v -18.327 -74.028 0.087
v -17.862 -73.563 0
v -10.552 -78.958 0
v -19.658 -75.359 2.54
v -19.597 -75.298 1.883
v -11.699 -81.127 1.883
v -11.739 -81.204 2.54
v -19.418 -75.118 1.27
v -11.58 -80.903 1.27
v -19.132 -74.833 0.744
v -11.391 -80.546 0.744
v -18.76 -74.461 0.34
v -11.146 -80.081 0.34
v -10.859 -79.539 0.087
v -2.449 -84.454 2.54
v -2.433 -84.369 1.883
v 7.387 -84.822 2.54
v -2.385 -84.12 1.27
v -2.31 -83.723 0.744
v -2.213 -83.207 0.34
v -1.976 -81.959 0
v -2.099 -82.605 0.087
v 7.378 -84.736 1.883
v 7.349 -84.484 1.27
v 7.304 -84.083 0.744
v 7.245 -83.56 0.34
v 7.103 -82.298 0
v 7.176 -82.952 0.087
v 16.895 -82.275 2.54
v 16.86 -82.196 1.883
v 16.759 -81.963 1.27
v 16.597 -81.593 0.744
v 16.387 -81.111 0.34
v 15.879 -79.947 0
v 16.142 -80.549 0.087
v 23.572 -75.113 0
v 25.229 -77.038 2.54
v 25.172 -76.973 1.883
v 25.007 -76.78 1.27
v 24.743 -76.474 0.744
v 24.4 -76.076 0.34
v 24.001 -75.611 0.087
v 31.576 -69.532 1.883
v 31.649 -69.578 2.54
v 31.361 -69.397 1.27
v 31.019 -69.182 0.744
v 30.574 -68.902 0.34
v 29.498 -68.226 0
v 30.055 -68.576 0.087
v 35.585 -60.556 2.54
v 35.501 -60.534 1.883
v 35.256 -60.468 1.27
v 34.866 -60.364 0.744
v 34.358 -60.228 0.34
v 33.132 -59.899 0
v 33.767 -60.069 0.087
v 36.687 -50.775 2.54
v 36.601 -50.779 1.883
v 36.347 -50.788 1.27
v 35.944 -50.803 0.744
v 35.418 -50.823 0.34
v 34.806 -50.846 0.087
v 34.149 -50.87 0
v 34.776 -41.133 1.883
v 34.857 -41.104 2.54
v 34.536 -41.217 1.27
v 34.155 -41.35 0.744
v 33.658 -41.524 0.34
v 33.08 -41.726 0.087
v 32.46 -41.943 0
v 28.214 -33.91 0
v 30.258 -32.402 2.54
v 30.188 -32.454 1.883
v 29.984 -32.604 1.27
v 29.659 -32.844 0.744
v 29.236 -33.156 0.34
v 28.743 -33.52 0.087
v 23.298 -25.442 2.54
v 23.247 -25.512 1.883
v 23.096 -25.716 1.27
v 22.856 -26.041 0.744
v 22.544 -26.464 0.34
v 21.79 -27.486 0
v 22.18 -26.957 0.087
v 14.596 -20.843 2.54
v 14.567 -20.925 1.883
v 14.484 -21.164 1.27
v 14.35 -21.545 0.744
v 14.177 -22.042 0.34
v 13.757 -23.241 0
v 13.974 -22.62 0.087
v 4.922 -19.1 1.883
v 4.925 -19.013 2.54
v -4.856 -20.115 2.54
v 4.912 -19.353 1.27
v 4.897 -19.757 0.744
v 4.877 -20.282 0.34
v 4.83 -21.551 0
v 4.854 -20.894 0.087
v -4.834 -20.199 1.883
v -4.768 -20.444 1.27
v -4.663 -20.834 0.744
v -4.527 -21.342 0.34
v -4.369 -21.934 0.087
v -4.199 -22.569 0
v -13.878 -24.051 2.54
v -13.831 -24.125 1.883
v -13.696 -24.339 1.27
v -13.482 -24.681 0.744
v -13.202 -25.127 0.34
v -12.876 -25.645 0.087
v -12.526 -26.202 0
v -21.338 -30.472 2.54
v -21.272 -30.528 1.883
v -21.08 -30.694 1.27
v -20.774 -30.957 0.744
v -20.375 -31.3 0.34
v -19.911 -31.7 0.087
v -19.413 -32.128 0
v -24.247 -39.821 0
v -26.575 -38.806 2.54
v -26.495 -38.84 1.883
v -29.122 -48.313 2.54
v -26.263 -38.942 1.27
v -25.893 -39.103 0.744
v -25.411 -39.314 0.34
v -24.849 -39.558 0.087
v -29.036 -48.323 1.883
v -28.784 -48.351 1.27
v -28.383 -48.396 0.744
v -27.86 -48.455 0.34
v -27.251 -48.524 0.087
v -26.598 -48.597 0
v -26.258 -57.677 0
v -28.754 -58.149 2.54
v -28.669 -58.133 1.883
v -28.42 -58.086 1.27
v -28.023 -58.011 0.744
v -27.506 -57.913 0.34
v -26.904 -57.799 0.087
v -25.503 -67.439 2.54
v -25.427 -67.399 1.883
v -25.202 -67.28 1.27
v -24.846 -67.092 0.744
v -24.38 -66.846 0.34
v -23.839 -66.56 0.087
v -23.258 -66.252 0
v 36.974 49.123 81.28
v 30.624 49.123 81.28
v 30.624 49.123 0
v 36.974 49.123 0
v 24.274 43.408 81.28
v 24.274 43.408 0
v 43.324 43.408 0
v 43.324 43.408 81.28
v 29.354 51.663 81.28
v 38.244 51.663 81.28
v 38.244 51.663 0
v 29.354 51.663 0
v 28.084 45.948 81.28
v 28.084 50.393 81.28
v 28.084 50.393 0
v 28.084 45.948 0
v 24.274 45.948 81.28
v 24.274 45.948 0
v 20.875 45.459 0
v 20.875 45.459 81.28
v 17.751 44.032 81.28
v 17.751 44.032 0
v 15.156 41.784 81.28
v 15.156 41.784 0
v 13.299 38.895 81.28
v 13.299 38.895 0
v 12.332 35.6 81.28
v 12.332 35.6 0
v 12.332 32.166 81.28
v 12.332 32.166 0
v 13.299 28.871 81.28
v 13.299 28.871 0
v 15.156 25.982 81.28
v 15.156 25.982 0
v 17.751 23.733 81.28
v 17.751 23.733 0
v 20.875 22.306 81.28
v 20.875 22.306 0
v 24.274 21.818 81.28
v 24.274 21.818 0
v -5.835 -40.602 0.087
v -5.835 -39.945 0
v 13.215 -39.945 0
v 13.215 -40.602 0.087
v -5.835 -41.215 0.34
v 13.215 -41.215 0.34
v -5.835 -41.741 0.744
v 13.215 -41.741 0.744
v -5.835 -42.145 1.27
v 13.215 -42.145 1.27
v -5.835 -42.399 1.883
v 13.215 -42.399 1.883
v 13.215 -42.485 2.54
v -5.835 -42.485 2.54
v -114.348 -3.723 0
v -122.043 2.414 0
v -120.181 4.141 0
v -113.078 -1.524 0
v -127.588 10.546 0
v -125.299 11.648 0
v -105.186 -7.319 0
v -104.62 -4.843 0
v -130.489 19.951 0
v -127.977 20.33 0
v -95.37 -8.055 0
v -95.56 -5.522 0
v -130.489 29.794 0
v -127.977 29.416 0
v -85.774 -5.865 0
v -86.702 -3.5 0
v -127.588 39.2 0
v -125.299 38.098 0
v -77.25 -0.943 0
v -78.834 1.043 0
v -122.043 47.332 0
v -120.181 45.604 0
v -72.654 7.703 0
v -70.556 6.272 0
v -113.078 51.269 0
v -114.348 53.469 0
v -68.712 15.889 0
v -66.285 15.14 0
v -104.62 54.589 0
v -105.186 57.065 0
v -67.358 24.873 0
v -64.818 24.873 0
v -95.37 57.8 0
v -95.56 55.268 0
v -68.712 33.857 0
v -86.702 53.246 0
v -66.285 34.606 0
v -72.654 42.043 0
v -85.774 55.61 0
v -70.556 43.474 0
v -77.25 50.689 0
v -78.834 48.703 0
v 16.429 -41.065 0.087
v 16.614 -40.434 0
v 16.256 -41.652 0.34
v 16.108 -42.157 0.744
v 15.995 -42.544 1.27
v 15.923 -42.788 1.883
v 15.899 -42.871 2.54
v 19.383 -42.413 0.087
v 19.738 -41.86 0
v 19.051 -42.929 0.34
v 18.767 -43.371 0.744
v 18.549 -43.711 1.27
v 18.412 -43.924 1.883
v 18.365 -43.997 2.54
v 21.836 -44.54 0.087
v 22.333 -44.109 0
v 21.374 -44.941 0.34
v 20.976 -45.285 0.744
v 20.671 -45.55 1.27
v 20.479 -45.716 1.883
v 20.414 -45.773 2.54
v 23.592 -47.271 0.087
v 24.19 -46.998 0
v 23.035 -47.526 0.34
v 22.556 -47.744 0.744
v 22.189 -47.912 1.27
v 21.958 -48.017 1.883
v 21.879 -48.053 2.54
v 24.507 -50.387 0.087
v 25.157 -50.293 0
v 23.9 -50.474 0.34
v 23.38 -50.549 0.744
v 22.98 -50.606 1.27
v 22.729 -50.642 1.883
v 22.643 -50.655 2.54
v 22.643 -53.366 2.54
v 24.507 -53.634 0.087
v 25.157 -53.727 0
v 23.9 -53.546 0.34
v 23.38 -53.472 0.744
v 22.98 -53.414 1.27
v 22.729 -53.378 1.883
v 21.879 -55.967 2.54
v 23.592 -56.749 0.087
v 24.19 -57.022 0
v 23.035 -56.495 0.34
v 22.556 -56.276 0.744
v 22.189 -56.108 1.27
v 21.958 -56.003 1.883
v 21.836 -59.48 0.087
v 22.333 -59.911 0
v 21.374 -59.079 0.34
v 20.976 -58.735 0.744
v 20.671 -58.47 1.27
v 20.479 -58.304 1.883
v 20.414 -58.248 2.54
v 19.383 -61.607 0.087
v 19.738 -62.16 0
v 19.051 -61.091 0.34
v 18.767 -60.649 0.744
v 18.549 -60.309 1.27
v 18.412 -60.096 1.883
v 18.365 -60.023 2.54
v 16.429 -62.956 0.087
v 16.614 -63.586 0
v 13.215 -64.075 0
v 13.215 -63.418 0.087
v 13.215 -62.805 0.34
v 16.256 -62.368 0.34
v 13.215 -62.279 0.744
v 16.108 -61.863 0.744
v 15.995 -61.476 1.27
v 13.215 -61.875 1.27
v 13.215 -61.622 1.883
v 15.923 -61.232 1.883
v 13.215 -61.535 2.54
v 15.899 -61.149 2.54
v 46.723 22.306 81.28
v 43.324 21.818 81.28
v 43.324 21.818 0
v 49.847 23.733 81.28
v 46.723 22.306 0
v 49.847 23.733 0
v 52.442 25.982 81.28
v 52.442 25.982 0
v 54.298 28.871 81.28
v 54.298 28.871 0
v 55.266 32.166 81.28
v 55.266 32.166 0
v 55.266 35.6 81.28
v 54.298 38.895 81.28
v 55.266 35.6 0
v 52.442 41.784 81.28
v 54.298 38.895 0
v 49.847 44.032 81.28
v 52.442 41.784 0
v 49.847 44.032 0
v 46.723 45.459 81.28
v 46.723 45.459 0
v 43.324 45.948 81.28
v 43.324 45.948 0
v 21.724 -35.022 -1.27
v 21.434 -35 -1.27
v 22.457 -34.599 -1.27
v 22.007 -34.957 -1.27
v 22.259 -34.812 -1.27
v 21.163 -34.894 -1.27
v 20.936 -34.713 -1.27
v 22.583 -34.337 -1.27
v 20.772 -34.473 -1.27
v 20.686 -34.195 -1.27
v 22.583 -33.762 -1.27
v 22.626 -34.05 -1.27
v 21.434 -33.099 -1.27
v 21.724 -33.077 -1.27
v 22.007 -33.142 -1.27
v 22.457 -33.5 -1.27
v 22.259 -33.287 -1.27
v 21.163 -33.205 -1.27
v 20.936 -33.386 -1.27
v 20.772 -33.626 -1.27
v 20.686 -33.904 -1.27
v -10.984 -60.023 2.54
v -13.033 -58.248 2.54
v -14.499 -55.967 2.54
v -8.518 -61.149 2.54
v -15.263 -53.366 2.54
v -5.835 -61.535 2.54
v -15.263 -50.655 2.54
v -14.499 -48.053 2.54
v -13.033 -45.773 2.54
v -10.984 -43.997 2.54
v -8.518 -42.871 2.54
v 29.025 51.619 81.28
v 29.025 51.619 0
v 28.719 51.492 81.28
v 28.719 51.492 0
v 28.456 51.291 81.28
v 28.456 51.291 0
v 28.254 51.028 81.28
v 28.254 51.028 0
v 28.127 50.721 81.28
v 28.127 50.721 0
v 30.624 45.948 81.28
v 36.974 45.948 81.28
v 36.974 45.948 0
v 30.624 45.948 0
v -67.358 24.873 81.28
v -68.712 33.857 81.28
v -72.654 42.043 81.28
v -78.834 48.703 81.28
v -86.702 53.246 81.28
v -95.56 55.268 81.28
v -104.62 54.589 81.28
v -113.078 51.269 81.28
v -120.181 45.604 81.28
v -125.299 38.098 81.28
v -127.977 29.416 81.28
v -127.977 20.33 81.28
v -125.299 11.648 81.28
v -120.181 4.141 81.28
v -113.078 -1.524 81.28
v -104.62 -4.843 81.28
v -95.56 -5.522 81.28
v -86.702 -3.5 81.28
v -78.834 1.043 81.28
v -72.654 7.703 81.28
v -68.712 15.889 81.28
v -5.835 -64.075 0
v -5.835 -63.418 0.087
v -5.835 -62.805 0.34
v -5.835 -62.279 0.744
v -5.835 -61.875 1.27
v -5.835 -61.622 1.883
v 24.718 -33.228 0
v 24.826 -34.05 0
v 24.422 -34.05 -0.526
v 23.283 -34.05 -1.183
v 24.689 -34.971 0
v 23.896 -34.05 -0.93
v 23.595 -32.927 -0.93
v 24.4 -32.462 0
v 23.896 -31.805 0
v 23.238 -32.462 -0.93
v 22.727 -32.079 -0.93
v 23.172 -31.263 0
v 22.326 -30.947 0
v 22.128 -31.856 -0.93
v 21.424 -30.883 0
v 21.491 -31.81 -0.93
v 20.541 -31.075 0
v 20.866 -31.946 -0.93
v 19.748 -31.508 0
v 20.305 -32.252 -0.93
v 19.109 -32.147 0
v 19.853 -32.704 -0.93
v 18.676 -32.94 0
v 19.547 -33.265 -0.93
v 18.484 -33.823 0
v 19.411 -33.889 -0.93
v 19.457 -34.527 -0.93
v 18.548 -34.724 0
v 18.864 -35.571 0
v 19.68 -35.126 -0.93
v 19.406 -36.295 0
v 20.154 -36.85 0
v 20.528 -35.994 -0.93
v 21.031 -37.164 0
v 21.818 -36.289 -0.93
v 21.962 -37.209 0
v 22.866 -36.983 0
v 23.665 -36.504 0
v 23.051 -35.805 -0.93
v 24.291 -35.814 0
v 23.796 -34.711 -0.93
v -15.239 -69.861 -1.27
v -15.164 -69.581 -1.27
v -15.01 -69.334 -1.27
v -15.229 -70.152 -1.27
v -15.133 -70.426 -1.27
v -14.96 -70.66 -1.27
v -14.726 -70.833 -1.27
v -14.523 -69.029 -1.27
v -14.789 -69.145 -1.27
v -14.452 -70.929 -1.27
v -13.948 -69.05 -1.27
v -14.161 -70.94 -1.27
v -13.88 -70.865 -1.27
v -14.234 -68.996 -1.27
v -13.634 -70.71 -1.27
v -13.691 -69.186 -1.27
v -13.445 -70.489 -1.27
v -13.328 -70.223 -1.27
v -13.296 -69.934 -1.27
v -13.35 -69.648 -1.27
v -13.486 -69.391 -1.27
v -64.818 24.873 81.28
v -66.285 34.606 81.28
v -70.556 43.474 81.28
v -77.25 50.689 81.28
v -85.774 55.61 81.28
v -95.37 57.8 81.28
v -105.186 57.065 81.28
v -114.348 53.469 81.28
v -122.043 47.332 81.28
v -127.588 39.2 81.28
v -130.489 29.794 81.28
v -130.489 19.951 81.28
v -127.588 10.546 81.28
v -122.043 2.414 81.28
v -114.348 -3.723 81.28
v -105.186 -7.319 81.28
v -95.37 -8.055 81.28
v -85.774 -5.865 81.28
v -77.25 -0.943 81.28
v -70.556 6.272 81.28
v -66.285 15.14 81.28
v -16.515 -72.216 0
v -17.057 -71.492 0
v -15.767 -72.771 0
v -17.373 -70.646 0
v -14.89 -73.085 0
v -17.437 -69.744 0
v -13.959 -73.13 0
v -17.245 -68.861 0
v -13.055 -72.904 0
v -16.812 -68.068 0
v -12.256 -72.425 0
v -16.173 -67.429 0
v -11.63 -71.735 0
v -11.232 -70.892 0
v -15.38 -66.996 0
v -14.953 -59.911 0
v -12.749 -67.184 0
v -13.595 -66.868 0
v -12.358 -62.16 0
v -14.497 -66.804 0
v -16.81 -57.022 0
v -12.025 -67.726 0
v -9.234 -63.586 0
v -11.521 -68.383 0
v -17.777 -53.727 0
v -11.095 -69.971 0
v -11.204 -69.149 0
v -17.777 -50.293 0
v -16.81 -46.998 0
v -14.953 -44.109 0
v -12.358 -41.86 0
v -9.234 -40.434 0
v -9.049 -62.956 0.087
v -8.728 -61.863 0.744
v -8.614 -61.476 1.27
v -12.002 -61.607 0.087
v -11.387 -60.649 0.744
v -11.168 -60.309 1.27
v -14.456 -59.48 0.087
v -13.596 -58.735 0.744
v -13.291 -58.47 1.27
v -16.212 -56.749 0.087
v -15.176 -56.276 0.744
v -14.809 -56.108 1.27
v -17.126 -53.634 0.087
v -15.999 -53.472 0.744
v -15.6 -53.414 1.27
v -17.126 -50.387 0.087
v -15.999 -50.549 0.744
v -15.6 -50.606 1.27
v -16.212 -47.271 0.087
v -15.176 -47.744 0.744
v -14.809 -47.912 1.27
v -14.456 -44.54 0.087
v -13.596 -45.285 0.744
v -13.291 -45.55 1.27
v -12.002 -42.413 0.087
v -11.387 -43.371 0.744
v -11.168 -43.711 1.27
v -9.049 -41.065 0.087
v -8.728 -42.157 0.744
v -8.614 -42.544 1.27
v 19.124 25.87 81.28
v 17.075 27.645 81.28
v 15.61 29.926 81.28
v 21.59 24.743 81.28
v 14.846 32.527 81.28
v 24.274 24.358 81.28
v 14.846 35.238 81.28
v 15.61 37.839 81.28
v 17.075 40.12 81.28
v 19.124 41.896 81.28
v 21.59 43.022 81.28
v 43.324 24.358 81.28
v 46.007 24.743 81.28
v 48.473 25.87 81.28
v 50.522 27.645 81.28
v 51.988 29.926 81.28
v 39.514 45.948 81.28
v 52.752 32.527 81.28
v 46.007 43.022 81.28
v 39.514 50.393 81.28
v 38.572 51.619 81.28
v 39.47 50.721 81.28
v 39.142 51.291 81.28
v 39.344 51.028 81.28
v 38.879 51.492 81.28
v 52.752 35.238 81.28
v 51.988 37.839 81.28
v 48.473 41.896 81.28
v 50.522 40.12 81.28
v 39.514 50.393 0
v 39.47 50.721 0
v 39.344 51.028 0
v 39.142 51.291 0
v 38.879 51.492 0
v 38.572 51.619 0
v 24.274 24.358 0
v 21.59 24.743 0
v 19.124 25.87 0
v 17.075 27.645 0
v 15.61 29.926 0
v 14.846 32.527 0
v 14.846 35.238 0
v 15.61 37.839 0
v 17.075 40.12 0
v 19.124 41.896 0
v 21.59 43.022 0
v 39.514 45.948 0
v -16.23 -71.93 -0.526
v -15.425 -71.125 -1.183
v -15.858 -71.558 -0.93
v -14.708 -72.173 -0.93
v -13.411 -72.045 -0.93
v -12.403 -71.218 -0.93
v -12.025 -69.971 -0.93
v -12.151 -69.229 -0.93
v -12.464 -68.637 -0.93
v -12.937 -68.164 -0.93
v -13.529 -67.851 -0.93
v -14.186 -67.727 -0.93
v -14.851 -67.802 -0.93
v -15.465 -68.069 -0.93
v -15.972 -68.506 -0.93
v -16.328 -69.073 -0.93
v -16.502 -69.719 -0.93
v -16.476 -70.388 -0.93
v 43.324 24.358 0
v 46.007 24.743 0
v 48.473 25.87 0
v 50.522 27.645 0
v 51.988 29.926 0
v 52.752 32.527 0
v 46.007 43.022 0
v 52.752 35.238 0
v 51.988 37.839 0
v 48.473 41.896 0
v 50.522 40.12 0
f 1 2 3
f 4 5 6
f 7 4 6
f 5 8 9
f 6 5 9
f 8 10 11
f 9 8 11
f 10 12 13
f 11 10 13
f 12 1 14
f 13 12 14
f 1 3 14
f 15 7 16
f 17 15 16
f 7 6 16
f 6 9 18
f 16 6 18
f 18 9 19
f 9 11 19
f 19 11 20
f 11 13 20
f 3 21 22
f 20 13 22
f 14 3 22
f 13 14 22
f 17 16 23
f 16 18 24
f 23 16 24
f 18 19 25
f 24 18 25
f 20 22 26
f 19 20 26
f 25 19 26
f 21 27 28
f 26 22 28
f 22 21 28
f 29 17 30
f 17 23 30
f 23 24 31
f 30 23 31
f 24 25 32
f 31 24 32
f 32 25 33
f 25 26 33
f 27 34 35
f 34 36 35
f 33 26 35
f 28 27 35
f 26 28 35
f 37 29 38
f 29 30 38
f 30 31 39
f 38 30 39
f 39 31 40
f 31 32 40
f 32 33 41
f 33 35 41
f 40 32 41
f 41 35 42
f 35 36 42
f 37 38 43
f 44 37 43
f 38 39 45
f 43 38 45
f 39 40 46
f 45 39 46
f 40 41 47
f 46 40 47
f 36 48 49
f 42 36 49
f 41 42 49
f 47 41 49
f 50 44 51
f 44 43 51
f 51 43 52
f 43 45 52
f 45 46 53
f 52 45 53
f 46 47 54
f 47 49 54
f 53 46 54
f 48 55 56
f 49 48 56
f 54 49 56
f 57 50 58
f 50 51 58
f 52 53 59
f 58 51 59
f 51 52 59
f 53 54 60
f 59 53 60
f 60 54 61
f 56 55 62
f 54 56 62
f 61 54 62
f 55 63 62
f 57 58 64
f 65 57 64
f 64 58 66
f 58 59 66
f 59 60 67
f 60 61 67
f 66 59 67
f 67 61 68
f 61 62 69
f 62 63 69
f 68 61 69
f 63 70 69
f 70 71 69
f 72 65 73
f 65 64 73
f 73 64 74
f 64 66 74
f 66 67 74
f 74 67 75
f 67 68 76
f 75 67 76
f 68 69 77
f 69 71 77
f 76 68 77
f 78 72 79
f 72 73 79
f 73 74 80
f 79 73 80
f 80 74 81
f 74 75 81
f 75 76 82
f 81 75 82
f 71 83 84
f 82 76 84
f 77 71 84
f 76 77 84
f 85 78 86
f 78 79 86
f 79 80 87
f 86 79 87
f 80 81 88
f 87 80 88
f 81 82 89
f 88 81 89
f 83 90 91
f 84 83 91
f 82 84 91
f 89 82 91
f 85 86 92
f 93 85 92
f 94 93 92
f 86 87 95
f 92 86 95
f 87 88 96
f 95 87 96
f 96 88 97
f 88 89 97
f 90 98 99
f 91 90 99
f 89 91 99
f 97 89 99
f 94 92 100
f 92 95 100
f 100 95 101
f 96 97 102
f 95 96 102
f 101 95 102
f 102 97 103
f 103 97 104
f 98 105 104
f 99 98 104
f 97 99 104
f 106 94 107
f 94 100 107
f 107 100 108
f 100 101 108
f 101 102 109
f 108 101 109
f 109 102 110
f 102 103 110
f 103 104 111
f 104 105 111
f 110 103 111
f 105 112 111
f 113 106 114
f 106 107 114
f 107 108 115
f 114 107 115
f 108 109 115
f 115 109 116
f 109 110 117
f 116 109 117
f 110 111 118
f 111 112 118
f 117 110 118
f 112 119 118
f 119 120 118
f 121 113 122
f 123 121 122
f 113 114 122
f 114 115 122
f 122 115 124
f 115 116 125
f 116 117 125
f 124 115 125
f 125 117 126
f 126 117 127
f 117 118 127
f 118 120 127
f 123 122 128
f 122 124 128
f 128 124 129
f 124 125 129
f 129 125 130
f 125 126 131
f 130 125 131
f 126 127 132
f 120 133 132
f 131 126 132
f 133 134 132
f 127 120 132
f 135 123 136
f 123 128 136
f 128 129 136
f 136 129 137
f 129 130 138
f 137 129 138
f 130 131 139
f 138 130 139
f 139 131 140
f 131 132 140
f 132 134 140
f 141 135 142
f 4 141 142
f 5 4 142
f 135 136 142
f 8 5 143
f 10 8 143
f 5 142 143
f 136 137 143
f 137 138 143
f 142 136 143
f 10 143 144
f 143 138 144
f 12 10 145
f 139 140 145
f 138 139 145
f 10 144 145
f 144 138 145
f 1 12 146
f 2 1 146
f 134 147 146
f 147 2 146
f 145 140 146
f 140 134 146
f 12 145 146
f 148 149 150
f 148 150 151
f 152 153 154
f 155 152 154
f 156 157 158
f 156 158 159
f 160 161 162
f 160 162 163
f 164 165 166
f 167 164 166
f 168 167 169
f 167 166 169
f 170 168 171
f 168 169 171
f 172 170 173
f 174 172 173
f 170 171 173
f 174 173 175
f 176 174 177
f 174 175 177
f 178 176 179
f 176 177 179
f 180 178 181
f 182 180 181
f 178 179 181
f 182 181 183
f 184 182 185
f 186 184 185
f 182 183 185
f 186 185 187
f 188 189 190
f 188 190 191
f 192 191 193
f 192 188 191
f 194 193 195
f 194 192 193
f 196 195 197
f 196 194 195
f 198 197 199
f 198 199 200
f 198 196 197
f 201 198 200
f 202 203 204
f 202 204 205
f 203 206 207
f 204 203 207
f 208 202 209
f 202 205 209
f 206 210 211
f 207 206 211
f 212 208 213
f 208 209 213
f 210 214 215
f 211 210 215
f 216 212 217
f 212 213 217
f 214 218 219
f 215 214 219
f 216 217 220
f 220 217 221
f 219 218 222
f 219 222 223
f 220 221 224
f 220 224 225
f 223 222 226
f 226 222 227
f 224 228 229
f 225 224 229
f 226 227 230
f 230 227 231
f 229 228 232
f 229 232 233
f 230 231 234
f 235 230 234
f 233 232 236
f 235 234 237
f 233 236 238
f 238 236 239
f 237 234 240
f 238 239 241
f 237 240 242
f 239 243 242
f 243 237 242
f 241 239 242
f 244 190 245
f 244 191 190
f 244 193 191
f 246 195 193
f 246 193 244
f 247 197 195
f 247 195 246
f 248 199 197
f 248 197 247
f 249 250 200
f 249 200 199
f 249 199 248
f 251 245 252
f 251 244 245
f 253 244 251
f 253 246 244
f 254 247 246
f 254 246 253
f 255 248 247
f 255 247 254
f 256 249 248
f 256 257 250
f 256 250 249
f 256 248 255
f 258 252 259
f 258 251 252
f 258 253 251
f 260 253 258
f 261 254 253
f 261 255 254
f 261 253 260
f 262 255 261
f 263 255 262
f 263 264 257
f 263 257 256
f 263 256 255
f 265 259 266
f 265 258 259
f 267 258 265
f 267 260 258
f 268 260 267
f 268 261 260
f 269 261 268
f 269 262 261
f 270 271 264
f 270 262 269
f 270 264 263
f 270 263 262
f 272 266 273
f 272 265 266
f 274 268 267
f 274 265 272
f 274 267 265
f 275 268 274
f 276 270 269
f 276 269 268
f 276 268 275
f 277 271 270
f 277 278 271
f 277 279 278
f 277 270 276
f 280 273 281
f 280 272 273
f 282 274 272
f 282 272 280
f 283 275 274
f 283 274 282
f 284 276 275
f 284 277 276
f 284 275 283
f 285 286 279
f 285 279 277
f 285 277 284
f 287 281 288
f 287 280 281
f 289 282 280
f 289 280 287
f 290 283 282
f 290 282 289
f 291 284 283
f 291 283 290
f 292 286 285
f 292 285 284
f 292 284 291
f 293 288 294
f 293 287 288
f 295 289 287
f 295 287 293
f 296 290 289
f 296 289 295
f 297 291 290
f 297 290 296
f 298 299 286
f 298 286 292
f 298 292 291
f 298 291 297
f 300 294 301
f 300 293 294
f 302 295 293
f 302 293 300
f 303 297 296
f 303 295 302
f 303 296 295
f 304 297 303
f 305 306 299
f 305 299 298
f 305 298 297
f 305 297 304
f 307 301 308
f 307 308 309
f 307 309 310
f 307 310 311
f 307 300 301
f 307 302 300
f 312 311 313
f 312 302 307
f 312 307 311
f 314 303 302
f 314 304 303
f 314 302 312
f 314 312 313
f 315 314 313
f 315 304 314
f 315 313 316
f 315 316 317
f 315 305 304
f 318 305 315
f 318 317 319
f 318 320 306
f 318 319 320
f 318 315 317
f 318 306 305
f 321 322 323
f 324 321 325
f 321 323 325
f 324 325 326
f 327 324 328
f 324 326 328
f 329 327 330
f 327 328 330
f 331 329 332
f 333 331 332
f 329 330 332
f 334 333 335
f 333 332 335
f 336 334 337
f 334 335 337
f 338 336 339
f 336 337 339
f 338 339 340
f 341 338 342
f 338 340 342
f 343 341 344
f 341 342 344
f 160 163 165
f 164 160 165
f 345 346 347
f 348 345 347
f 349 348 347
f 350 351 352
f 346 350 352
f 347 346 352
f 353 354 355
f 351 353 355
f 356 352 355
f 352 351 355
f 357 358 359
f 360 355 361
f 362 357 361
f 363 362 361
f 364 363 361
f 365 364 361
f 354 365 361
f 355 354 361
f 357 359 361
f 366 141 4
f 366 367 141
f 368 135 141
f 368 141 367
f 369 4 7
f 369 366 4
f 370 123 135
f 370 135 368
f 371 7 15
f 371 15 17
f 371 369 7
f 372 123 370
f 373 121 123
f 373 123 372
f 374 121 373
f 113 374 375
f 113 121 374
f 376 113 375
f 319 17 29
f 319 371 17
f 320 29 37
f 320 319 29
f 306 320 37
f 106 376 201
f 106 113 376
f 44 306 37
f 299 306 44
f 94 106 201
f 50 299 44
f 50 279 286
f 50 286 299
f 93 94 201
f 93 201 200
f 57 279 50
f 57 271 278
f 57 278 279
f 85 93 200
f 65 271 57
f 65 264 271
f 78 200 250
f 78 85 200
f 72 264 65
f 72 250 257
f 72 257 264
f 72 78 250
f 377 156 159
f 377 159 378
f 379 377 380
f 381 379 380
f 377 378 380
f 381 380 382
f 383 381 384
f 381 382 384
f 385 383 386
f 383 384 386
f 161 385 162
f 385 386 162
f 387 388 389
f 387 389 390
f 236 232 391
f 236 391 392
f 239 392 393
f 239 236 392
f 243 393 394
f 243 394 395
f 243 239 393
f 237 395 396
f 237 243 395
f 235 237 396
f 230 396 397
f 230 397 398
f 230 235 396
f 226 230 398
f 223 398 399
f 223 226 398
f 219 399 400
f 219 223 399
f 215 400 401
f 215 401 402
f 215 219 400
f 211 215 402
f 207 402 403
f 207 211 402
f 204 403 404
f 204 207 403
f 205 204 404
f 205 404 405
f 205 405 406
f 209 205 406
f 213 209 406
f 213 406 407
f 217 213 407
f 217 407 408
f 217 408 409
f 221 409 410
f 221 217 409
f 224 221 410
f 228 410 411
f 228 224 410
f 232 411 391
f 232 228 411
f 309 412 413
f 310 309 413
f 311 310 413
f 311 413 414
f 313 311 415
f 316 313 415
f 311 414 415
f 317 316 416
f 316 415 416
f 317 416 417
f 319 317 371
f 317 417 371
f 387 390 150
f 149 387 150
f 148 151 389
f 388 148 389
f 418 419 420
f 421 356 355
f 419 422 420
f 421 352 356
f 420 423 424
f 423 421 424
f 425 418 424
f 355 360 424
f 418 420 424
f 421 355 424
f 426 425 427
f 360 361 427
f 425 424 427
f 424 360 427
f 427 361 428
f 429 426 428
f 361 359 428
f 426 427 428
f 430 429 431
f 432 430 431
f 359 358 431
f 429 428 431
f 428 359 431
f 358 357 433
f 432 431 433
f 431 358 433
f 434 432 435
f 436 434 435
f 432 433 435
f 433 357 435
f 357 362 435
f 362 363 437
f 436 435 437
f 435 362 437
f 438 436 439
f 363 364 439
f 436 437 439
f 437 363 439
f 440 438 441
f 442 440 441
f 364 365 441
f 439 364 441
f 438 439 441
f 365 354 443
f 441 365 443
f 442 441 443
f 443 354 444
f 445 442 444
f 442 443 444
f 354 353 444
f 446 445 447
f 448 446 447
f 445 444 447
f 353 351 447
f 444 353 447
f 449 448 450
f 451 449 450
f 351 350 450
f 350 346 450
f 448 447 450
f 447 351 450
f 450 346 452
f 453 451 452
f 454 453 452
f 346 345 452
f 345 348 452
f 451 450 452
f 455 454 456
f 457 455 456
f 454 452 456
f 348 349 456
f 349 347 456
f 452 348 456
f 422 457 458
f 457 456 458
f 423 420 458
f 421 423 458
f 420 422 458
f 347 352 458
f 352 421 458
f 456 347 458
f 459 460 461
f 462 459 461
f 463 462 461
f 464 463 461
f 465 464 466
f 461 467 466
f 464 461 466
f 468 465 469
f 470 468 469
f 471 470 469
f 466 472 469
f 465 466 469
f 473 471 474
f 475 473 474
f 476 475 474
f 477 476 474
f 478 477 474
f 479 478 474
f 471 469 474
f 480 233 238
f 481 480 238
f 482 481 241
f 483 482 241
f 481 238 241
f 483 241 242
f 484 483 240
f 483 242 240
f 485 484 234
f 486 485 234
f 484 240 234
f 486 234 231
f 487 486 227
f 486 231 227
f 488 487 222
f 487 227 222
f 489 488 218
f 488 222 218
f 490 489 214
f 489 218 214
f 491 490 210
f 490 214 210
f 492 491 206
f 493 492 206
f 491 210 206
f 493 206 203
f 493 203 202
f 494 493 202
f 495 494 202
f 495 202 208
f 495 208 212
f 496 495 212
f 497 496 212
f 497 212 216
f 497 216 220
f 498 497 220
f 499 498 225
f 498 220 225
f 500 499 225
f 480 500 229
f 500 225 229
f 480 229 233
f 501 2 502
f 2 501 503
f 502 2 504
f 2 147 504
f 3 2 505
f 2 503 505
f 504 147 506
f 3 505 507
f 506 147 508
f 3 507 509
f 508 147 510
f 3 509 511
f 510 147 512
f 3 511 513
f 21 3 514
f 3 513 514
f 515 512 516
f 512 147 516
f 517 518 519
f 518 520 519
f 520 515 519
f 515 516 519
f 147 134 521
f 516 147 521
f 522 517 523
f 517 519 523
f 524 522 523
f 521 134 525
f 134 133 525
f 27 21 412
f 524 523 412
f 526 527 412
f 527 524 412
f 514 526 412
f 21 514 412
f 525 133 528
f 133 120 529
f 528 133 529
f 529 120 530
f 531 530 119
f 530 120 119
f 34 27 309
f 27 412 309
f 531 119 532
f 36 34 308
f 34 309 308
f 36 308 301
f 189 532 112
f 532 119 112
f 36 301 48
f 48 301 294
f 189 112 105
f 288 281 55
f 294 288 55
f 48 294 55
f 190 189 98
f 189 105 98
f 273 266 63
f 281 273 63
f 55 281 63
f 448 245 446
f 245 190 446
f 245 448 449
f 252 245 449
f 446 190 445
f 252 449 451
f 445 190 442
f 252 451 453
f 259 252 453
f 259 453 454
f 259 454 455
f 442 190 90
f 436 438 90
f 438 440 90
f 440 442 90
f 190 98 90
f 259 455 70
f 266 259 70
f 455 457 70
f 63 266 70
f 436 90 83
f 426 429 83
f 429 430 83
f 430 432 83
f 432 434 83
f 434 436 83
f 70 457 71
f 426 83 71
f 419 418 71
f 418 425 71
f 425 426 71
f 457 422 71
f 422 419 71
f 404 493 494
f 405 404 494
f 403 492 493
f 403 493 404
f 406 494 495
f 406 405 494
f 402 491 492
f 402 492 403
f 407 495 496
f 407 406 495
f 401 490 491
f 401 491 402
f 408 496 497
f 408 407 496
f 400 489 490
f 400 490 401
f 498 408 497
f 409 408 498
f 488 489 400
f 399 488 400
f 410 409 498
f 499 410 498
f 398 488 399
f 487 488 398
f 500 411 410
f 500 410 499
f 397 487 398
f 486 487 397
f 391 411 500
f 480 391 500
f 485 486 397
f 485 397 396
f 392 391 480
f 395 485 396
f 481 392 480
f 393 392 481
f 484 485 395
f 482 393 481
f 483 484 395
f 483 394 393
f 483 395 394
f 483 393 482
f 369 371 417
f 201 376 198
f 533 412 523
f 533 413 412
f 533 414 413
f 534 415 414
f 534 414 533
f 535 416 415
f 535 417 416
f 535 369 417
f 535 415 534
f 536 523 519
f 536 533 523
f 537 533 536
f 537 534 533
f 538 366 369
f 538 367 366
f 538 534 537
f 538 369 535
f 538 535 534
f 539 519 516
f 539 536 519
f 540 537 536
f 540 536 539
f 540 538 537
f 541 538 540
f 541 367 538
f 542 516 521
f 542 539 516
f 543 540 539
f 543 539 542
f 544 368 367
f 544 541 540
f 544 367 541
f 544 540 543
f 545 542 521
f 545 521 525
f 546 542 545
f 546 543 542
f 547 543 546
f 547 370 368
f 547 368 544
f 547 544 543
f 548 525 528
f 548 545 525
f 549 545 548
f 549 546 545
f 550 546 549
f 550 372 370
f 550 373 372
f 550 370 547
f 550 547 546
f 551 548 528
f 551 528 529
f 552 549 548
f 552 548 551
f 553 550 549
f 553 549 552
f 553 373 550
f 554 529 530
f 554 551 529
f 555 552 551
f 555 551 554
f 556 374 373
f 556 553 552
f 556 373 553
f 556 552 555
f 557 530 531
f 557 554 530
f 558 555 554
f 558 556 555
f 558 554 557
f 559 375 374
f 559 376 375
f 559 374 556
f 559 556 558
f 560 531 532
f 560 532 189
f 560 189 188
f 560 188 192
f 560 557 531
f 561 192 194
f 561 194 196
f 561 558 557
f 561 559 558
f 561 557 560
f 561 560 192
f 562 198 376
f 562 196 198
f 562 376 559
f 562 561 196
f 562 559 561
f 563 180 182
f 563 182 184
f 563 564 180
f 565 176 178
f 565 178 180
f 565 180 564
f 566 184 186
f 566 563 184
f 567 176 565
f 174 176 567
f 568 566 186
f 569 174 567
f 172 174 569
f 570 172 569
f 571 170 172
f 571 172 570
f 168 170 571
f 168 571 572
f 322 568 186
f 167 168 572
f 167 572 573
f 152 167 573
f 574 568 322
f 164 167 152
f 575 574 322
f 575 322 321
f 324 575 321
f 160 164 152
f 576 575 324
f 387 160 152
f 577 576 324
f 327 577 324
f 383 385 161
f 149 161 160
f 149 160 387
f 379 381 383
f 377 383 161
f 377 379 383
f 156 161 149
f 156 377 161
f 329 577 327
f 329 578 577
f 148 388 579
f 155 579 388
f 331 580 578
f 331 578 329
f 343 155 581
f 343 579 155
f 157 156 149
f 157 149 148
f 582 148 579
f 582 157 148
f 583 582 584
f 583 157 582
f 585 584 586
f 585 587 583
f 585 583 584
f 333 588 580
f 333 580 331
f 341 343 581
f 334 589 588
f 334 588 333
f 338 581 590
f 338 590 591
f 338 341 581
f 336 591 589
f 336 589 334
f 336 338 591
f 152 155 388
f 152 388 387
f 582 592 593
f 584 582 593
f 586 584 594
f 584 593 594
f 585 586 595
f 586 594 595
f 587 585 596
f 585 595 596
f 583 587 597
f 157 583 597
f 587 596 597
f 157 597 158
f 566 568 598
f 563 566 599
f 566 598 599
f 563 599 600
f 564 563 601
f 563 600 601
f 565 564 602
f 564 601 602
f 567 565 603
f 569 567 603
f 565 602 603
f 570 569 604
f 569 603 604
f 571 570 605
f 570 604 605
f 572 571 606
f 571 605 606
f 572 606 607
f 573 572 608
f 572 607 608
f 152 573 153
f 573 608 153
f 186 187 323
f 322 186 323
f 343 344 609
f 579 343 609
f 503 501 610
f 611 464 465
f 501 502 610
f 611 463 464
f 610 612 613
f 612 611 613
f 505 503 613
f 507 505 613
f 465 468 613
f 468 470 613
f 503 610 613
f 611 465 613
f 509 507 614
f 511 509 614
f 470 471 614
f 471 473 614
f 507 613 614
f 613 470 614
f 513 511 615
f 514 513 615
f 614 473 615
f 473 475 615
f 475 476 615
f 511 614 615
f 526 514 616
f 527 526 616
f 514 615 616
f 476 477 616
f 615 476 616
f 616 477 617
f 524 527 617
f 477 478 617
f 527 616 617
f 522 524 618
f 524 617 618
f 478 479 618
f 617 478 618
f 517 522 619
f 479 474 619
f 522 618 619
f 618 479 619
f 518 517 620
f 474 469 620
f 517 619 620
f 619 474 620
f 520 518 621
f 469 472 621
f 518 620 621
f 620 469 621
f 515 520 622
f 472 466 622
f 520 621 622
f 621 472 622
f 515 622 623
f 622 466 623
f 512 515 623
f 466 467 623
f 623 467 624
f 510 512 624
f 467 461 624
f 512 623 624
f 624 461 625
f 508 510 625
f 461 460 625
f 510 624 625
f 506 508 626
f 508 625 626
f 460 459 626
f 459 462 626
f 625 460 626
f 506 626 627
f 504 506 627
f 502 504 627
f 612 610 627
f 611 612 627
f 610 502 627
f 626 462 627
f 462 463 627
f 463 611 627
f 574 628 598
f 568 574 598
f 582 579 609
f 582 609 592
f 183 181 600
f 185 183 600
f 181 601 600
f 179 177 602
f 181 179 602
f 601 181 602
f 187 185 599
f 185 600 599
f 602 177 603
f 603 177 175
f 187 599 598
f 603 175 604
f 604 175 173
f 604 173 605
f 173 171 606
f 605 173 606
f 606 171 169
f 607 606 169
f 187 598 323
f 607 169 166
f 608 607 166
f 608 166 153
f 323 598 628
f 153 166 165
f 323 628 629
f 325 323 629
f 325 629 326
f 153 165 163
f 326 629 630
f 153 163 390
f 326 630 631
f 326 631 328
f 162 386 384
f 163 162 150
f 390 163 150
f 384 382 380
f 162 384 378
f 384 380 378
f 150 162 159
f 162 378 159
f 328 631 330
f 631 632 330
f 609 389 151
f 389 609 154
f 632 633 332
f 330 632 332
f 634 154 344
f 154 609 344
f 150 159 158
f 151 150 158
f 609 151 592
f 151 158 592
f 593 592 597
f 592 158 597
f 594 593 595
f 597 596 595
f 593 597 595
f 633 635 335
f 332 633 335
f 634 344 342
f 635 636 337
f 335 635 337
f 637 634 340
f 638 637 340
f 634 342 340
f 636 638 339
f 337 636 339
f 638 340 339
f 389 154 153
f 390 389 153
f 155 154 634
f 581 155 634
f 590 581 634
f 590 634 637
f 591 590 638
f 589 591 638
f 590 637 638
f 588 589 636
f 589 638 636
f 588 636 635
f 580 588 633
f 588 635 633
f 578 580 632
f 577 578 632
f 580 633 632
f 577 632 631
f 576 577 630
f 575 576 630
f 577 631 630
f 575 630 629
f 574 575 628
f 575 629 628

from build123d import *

# Parameters (mm, degrees)
F0_R         = 33.02
F0_R_2       = 30.48
F1_DEPTH     = 81.28
F2_DEPTH     = 2.54
F3_DEPTH     = 1.27
F4_T1_DEPTH  = 19.05
F4_T8_ANGLE  = 180
F4_T12_ANGLE = 180


# Not quite as in the source:
# - a fillet or chamfer that OpenCascade refuses, or shapes differently, is made with other operations: its cross-section is extruded or revolved along the edge and cut away or added


with BuildPart() as f1:
    # F0 (on Top) → F1 (new body)
    with BuildSketch(Plane.XY):
        with Locations((-97.8379249573, 24.8728301376)):
            Circle(F0_R)
        with Locations((-97.8379249573, 24.8728301376)):
            Circle(F0_R_2, mode=Mode.SUBTRACT)
    extrude(amount=F1_DEPTH)


with BuildPart() as f1b:
    # F0 (on Top) → F1, piece 2 (new body)
    with BuildSketch(Plane.XY):
        with BuildLine():
            Line((36.9737733483, 45.9476387101), (39.5137733483, 45.9476387101))
            Line((39.5137733483, 45.9476387101), (39.5137733483, 50.3926387101))
            ThreePointArc((39.5137733483, 50.3926387101), (39.1417989604, 51.2906643222), (38.2437733483, 51.6626387101))
            Line((38.2437733483, 51.6626387101), (29.3537733483, 51.6626387101))
            ThreePointArc((29.3537733483, 51.6626387101), (28.4557477362, 51.2906643222), (28.0837733483, 50.3926387101))
            Line((28.0837733483, 50.3926387101), (28.0837733483, 45.9476387101))
            Line((28.0837733483, 45.9476387101), (30.6237733483, 45.9476387101))
            Line((30.6237733483, 45.9476387101), (30.6237733483, 49.1226387101))
            Line((30.6237733483, 49.1226387101), (36.9737733483, 49.1226387101))
            Line((36.9737733483, 49.1226387101), (36.9737733483, 45.9476387101))
        make_face()
        with BuildLine():
            ThreePointArc((43.3237733483, 21.8176387101), (55.3887733483, 33.8826387101), (43.3237733483, 45.9476387101))
            Line((43.3237733483, 45.9476387101), (39.5137733483, 45.9476387101))
            Line((39.5137733483, 45.9476387101), (36.9737733483, 45.9476387101))
            Line((36.9737733483, 45.9476387101), (30.6237733483, 45.9476387101))
            Line((30.6237733483, 45.9476387101), (28.0837733483, 45.9476387101))
            Line((28.0837733483, 45.9476387101), (24.2737733483, 45.9476387101))
            ThreePointArc((24.2737733483, 45.9476387101), (12.2087733483, 33.8826387101), (24.2737733483, 21.8176387101))
            Line((24.2737733483, 21.8176387101), (43.3237733483, 21.8176387101))
        make_face()
        with BuildLine():
            ThreePointArc((24.2737733483, 24.3576387101), (14.7487733483, 33.8826387101), (24.2737733483, 43.4076387101))
            Line((24.2737733483, 43.4076387101), (43.3237733483, 43.4076387101))
            ThreePointArc((43.3237733483, 43.4076387101), (52.8487733483, 33.8826387101), (43.3237733483, 24.3576387101))
            Line((43.3237733483, 24.3576387101), (24.2737733483, 24.3576387101))
        make_face(mode=Mode.SUBTRACT)
    extrude(amount=F1_DEPTH)


with BuildPart() as f2:
    # F0 (on Top) → F2 (new body)
    with BuildSketch(Plane.XY):
        with BuildLine():
            Line((23.8957638139, -31.8045213862), (27.0388534563, -28.6614317439))
            ThreePointArc((27.0388534563, -28.6614317439), (-19.6584783733, -28.6614317439), (-19.6584783733, -75.3587635734))
            Line((-19.6584783733, -75.3587635734), (-16.5153887309, -72.215673931))
            ThreePointArc((-16.5153887309, -72.215673931), (-16.5153887309, -67.7255458705), (-12.0252606704, -67.7255458705))
            Line((-12.0252606704, -67.7255458705), (-5.8348124585, -61.5350976586))
            ThreePointArc((-5.8348124585, -61.5350976586), (-15.3598124585, -52.0100976586), (-5.8348124585, -42.4850976586))
            Line((-5.8348124585, -42.4850976586), (13.2151875415, -42.4850976586))
            Line((13.2151875415, -42.4850976586), (19.4056357534, -36.2946494468))
            ThreePointArc((19.4056357534, -36.2946494468), (19.4056357534, -31.8045213862), (23.8957638139, -31.8045213862))
        make_face()
        with BuildLine():
            ThreePointArc((-19.6584783733, -75.3587635734), (16.3263944782, -82.5165998222), (36.7101875415, -52.0100976586))
            ThreePointArc((36.7101875415, -52.0100976586), (34.196689705, -39.3738907219), (27.0388534563, -28.6614317439))
            Line((27.0388534563, -28.6614317439), (23.8957638139, -31.8045213862))
            ThreePointArc((23.8957638139, -31.8045213862), (24.5840172994, -32.8345655187), (24.8256997837, -34.0495854165))
            ThreePointArc((24.8256997837, -34.0495854165), (22.8657196814, -36.9829029322), (19.4056357534, -36.2946494468))
            Line((19.4056357534, -36.2946494468), (13.2151875415, -42.4850976586))
            ThreePointArc((13.2151875415, -42.4850976586), (22.7401875415, -52.0100976586), (13.2151875415, -61.5350976586))
            Line((13.2151875415, -61.5350976586), (-5.8348124585, -61.5350976586))
            Line((-5.8348124585, -61.5350976586), (-12.0252606704, -67.7255458705))
            ThreePointArc((-12.0252606704, -67.7255458705), (-11.3370071849, -68.755590003), (-11.0953247006, -69.9706099008))
            ThreePointArc((-11.0953247006, -69.9706099008), (-13.0553048029, -72.9039274165), (-16.5153887309, -72.215673931))
            Line((-16.5153887309, -72.215673931), (-19.6584783733, -75.3587635734))
        make_face()
        with BuildLine():
            Line((-14.2703247006, -69.9706099008), (-16.5153887309, -72.215673931))
            ThreePointArc((-16.5153887309, -72.215673931), (-13.0553048029, -72.9039274165), (-11.0953247006, -69.9706099008))
            ThreePointArc((-11.0953247006, -69.9706099008), (-11.3370071849, -68.755590003), (-12.0252606704, -67.7255458705))
            Line((-12.0252606704, -67.7255458705), (-14.2703247006, -69.9706099008))
        make_face()
        with BuildLine():
            ThreePointArc((-12.0252606704, -67.7255458705), (-16.5153887309, -67.7255458705), (-16.5153887309, -72.215673931))
            Line((-16.5153887309, -72.215673931), (-14.2703247006, -69.9706099008))
            Line((-14.2703247006, -69.9706099008), (-12.0252606704, -67.7255458705))
        make_face()
        with BuildLine():
            Line((21.6506997837, -34.0495854165), (23.8957638139, -31.8045213862))
            ThreePointArc((23.8957638139, -31.8045213862), (19.4056357534, -31.8045213862), (19.4056357534, -36.2946494468))
            Line((19.4056357534, -36.2946494468), (21.6506997837, -34.0495854165))
        make_face()
        with BuildLine():
            ThreePointArc((24.8256997837, -34.0495854165), (24.5840172994, -32.8345655187), (23.8957638139, -31.8045213862))
            Line((23.8957638139, -31.8045213862), (21.6506997837, -34.0495854165))
            Line((21.6506997837, -34.0495854165), (19.4056357534, -36.2946494468))
            ThreePointArc((19.4056357534, -36.2946494468), (22.8657196814, -36.9829029322), (24.8256997837, -34.0495854165))
        make_face()
    extrude(amount=F2_DEPTH)

    # F0 (on Top) → F3 (join)
    with BuildSketch(Plane.XY):
        with BuildLine():
            ThreePointArc((24.8256997837, -34.0495854165), (24.5840172994, -32.8345655187), (23.8957638139, -31.8045213862))
            Line((23.8957638139, -31.8045213862), (21.6506997837, -34.0495854165))
            Line((21.6506997837, -34.0495854165), (19.4056357534, -36.2946494468))
            ThreePointArc((19.4056357534, -36.2946494468), (22.8657196814, -36.9829029322), (24.8256997837, -34.0495854165))
        make_face()
        with BuildLine():
            Line((21.6506997837, -34.0495854165), (23.8957638139, -31.8045213862))
            ThreePointArc((23.8957638139, -31.8045213862), (19.4056357534, -31.8045213862), (19.4056357534, -36.2946494468))
            Line((19.4056357534, -36.2946494468), (21.6506997837, -34.0495854165))
        make_face()
        with BuildLine():
            ThreePointArc((-12.0252606704, -67.7255458705), (-16.5153887309, -67.7255458705), (-16.5153887309, -72.215673931))
            Line((-16.5153887309, -72.215673931), (-14.2703247006, -69.9706099008))
            Line((-14.2703247006, -69.9706099008), (-12.0252606704, -67.7255458705))
        make_face()
        with BuildLine():
            Line((-14.2703247006, -69.9706099008), (-16.5153887309, -72.215673931))
            ThreePointArc((-16.5153887309, -72.215673931), (-13.0553048029, -72.9039274165), (-11.0953247006, -69.9706099008))
            ThreePointArc((-11.0953247006, -69.9706099008), (-11.3370071849, -68.755590003), (-12.0252606704, -67.7255458705))
            Line((-12.0252606704, -67.7255458705), (-14.2703247006, -69.9706099008))
        make_face()
    extrude(amount=-F3_DEPTH)

    # F4: fillet of radius 2.54 on 7 edges, made by hand

    # F4_s2 → F4_t1 (cut)
    with BuildSketch(Plane.YZ.offset(-5.8348124585)):
        with BuildLine():
            ThreePointArc((-64.0750976586, 0), (-62.2790464344, 0.7439487758), (-61.5350976586, 2.54))
            Line((-61.5350976586, 2.54), (-61.5350976586, 0))
            Line((-61.5350976586, 0), (-64.0750976586, 0))
        make_face()
        with BuildLine():
            ThreePointArc((-39.9450976586, 0), (-41.7411488828, 0.7439487758), (-42.4850976586, 2.54))
            Line((-42.4850976586, 2.54), (-42.4850976586, 0))
            Line((-42.4850976586, 0), (-39.9450976586, 0))
        make_face()
    extrude(amount=F4_T1_DEPTH, mode=Mode.SUBTRACT)

    # F4_s3 → F4_t4 (revolve, cut)
    with BuildSketch(Plane.XZ.offset(34.0495854165)):
        with BuildLine():
            ThreePointArc((24.8256997837, 0), (23.895995258, -0.9297045256), (22.625995258, -1.27))
            Line((22.625995258, -1.27), (24.8256997837, -1.27))
            Line((24.8256997837, -1.27), (24.8256997837, 0))
        make_face()
    revolve(axis=Axis((21.6506997837, -34.0495854165, -1.27), (0, 0, 1)), mode=Mode.SUBTRACT)

    # F4_s5 → F4_t6 (revolve, cut)
    with BuildSketch(Plane(origin=(27.8501426001, -27.8501426001, 0), x_dir=(0, 0, 1), z_dir=(-0.7071067812, 0.7071067812, 0))):
        with BuildLine():
            ThreePointArc((0, -62.7423361101), (-0.9297045256, -61.8126315845), (-1.27, -60.5426315845))
            Line((-1.27, -60.5426315845), (-1.27, -62.7423361101))
            Line((-1.27, -62.7423361101), (0, -62.7423361101))
        make_face()
    revolve(axis=Axis((-14.2703247006, -69.9706099008, -1.27), (0, 0, 1)), mode=Mode.SUBTRACT)

    # F4_s7 → F4_t8 (revolve, cut)
    with BuildSketch(Plane.YZ.offset(13.2151875415)):
        with BuildLine():
            ThreePointArc((-39.9450976586, 0), (-41.7411488828, 0.7439487758), (-42.4850976586, 2.54))
            Line((-42.4850976586, 2.54), (-42.4850976586, 0))
            Line((-42.4850976586, 0), (-39.9450976586, 0))
        make_face()
    revolve(axis=Axis((13.2151875415, -52.0100976586, 0), (0, 0, -1)), revolution_arc=F4_T8_ANGLE, mode=Mode.SUBTRACT)

    # F4_s9 → F4_t10 (revolve, cut)
    with BuildSketch(Plane(origin=(27.8501426001, -27.8501426001, 0), x_dir=(0, 0, 1), z_dir=(-0.7071067812, 0.7071067812, 0))):
        with BuildLine():
            ThreePointArc((2.54, -67.1873361101), (0.7439487758, -66.4433873344), (0, -64.6473361101))
            Line((0, -64.6473361101), (0, -67.1873361101))
            Line((0, -67.1873361101), (2.54, -67.1873361101))
        make_face()
    revolve(axis=Axis((3.6901875415, -52.0100976586, 0), (0, 0, 1)), mode=Mode.SUBTRACT)

    # F4_s11 → F4_t12 (revolve, cut)
    with BuildSketch(Plane.YZ.offset(-5.8348124585)):
        with BuildLine():
            ThreePointArc((-64.0750976586, 0), (-62.2790464344, 0.7439487758), (-61.5350976586, 2.54))
            Line((-61.5350976586, 2.54), (-61.5350976586, 0))
            Line((-61.5350976586, 0), (-64.0750976586, 0))
        make_face()
    revolve(axis=Axis((-5.8348124585, -52.0100976586, 0), (0, 0, -1)), revolution_arc=F4_T12_ANGLE, mode=Mode.SUBTRACT)


solid = Compound([f1.part, f1b.part, f2.part])
